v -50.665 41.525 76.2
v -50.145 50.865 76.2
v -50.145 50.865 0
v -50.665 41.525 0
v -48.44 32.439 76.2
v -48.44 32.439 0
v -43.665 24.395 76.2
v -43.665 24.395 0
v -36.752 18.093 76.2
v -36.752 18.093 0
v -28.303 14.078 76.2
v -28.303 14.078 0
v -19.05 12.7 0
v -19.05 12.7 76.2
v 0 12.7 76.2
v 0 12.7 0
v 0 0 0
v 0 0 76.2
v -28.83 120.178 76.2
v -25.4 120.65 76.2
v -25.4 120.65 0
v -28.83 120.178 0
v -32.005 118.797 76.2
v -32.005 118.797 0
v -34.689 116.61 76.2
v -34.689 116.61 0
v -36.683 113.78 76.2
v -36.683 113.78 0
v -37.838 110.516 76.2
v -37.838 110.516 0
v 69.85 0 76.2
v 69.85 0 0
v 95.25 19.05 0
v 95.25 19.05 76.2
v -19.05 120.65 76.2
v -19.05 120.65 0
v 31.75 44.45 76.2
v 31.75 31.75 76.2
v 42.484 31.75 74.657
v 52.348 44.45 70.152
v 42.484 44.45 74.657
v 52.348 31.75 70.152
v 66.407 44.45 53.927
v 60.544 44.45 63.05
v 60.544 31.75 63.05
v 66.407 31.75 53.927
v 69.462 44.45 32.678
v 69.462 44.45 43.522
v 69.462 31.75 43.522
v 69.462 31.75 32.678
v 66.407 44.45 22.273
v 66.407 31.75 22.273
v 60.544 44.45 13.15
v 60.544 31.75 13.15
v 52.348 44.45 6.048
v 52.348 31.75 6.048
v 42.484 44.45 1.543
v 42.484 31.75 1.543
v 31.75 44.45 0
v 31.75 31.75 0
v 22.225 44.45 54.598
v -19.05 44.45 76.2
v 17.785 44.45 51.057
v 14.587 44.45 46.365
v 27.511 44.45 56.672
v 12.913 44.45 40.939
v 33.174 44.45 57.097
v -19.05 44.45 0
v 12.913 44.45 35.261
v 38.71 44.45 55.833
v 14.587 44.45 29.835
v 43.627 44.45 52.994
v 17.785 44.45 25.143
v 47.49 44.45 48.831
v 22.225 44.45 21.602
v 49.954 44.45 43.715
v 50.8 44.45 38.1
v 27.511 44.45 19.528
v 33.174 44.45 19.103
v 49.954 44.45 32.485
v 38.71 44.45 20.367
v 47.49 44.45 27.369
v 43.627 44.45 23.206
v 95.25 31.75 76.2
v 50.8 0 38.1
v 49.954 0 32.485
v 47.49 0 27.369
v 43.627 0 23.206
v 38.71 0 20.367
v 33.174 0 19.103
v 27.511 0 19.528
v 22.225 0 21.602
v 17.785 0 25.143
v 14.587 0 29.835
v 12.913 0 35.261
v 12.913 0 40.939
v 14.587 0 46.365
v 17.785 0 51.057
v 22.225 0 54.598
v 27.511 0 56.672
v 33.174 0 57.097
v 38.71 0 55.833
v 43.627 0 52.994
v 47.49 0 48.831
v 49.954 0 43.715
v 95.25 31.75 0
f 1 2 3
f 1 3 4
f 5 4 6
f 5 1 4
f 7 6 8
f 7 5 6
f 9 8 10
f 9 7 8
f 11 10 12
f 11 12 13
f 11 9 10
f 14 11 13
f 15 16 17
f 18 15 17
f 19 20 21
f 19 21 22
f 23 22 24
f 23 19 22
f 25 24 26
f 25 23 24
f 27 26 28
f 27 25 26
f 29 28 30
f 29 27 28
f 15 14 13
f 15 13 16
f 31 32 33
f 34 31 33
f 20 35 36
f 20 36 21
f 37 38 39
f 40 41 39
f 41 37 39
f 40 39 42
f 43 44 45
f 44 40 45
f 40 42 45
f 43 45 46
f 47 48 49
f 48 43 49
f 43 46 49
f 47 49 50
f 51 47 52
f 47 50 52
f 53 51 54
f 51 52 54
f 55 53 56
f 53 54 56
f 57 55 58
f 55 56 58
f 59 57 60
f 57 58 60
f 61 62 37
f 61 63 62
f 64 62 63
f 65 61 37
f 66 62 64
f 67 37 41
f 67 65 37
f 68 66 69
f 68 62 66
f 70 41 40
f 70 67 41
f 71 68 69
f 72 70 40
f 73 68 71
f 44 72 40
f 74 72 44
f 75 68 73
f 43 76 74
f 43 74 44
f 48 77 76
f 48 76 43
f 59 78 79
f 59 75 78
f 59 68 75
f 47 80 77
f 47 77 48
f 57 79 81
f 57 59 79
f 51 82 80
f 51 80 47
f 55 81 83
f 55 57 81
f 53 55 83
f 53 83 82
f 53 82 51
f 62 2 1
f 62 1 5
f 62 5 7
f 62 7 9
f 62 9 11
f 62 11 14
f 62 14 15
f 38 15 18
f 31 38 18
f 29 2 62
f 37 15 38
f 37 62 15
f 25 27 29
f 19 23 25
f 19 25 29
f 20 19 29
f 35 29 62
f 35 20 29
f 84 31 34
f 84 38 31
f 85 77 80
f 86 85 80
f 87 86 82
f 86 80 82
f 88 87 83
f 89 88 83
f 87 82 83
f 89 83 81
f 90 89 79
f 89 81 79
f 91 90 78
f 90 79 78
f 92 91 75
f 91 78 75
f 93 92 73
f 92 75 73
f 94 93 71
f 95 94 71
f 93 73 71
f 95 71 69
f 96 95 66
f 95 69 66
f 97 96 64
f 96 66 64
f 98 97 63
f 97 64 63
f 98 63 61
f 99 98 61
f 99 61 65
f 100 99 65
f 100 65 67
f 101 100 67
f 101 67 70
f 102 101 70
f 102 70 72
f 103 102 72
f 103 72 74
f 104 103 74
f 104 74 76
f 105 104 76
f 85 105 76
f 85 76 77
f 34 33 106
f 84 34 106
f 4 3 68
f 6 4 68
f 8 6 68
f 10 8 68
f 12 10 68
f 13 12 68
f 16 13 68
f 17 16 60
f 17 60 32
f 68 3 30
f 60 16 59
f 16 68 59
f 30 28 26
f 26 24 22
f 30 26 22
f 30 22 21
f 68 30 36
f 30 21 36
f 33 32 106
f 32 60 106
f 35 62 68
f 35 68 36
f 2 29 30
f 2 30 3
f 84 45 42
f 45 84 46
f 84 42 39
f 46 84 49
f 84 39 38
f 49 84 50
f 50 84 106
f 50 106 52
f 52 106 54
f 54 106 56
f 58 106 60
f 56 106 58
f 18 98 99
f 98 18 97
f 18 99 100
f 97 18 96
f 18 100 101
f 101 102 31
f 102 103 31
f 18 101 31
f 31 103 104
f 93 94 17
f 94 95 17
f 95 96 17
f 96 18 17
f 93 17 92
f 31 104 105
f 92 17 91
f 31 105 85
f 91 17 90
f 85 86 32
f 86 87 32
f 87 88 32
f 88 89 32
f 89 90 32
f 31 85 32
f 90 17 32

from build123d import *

# Parameters (mm, degrees)
BOSS_EXTRUDE1_DEPTH = 76.2
SKETCH2_R           = 38.1
BOSS_EXTRUDE2_DEPTH = 12.7
SKETCH3_R           = 19.05
CUT_EXTRUDE1_DEPTH  = 45.45
BOSS_EXTRUDE3_DEPTH = 76.2


with BuildPart() as part:
    # Sketch1 → Boss-Extrude1 (new body)
    with BuildSketch(Plane.XY):
        Polygon((0, 0), (69.85, 0), (95.25, 19.05), (95.25, 31.75), (31.75, 31.75), (31.75, 44.45), (-19.05, 44.45), (-19.05, 12.7), (0, 12.7), align=None)
    extrude(amount=BOSS_EXTRUDE1_DEPTH)

    # Sketch2 → Boss-Extrude2 (add, through all)
    with BuildSketch(Plane(origin=(0, 31.75, 0), x_dir=(1, 0, 0), z_dir=(0, 1, 0))):
        with Locations((31.75, -38.1)):
            Circle(SKETCH2_R)
    extrude(amount=BOSS_EXTRUDE2_DEPTH)

    # Sketch3 → Cut-Extrude1 (cut, through all)
    with BuildSketch(Plane(origin=(0, 44.45, 0), x_dir=(1, 0, 0), z_dir=(0, 1, 0))):
        with Locations((31.75, -38.1)):
            Circle(SKETCH3_R)
    extrude(amount=-CUT_EXTRUDE1_DEPTH, mode=Mode.SUBTRACT)

    # Sketch4 → Boss-Extrude3 (add, through all)
    with BuildSketch(Plane.XY.offset(76.2)):
        with BuildLine():
            Line((-19.05, 44.45), (-19.05, 120.65))
            Line((-19.05, 120.65), (-25.4, 120.65))
            ThreePointArc((-25.4, 120.65), (-33.421823369, 117.795829058), (-37.838031752, 110.516196825))
            Line((-37.838031752, 110.516196825), (-50.145079379, 50.865492062))
            ThreePointArc((-50.145079379, 50.865492062), (-43.664572645, 24.395441578), (-19.05, 12.7))
            Line((-19.05, 12.7), (-19.05, 44.45))
        make_face()
    extrude(amount=-BOSS_EXTRUDE3_DEPTH)


solid = part.part
